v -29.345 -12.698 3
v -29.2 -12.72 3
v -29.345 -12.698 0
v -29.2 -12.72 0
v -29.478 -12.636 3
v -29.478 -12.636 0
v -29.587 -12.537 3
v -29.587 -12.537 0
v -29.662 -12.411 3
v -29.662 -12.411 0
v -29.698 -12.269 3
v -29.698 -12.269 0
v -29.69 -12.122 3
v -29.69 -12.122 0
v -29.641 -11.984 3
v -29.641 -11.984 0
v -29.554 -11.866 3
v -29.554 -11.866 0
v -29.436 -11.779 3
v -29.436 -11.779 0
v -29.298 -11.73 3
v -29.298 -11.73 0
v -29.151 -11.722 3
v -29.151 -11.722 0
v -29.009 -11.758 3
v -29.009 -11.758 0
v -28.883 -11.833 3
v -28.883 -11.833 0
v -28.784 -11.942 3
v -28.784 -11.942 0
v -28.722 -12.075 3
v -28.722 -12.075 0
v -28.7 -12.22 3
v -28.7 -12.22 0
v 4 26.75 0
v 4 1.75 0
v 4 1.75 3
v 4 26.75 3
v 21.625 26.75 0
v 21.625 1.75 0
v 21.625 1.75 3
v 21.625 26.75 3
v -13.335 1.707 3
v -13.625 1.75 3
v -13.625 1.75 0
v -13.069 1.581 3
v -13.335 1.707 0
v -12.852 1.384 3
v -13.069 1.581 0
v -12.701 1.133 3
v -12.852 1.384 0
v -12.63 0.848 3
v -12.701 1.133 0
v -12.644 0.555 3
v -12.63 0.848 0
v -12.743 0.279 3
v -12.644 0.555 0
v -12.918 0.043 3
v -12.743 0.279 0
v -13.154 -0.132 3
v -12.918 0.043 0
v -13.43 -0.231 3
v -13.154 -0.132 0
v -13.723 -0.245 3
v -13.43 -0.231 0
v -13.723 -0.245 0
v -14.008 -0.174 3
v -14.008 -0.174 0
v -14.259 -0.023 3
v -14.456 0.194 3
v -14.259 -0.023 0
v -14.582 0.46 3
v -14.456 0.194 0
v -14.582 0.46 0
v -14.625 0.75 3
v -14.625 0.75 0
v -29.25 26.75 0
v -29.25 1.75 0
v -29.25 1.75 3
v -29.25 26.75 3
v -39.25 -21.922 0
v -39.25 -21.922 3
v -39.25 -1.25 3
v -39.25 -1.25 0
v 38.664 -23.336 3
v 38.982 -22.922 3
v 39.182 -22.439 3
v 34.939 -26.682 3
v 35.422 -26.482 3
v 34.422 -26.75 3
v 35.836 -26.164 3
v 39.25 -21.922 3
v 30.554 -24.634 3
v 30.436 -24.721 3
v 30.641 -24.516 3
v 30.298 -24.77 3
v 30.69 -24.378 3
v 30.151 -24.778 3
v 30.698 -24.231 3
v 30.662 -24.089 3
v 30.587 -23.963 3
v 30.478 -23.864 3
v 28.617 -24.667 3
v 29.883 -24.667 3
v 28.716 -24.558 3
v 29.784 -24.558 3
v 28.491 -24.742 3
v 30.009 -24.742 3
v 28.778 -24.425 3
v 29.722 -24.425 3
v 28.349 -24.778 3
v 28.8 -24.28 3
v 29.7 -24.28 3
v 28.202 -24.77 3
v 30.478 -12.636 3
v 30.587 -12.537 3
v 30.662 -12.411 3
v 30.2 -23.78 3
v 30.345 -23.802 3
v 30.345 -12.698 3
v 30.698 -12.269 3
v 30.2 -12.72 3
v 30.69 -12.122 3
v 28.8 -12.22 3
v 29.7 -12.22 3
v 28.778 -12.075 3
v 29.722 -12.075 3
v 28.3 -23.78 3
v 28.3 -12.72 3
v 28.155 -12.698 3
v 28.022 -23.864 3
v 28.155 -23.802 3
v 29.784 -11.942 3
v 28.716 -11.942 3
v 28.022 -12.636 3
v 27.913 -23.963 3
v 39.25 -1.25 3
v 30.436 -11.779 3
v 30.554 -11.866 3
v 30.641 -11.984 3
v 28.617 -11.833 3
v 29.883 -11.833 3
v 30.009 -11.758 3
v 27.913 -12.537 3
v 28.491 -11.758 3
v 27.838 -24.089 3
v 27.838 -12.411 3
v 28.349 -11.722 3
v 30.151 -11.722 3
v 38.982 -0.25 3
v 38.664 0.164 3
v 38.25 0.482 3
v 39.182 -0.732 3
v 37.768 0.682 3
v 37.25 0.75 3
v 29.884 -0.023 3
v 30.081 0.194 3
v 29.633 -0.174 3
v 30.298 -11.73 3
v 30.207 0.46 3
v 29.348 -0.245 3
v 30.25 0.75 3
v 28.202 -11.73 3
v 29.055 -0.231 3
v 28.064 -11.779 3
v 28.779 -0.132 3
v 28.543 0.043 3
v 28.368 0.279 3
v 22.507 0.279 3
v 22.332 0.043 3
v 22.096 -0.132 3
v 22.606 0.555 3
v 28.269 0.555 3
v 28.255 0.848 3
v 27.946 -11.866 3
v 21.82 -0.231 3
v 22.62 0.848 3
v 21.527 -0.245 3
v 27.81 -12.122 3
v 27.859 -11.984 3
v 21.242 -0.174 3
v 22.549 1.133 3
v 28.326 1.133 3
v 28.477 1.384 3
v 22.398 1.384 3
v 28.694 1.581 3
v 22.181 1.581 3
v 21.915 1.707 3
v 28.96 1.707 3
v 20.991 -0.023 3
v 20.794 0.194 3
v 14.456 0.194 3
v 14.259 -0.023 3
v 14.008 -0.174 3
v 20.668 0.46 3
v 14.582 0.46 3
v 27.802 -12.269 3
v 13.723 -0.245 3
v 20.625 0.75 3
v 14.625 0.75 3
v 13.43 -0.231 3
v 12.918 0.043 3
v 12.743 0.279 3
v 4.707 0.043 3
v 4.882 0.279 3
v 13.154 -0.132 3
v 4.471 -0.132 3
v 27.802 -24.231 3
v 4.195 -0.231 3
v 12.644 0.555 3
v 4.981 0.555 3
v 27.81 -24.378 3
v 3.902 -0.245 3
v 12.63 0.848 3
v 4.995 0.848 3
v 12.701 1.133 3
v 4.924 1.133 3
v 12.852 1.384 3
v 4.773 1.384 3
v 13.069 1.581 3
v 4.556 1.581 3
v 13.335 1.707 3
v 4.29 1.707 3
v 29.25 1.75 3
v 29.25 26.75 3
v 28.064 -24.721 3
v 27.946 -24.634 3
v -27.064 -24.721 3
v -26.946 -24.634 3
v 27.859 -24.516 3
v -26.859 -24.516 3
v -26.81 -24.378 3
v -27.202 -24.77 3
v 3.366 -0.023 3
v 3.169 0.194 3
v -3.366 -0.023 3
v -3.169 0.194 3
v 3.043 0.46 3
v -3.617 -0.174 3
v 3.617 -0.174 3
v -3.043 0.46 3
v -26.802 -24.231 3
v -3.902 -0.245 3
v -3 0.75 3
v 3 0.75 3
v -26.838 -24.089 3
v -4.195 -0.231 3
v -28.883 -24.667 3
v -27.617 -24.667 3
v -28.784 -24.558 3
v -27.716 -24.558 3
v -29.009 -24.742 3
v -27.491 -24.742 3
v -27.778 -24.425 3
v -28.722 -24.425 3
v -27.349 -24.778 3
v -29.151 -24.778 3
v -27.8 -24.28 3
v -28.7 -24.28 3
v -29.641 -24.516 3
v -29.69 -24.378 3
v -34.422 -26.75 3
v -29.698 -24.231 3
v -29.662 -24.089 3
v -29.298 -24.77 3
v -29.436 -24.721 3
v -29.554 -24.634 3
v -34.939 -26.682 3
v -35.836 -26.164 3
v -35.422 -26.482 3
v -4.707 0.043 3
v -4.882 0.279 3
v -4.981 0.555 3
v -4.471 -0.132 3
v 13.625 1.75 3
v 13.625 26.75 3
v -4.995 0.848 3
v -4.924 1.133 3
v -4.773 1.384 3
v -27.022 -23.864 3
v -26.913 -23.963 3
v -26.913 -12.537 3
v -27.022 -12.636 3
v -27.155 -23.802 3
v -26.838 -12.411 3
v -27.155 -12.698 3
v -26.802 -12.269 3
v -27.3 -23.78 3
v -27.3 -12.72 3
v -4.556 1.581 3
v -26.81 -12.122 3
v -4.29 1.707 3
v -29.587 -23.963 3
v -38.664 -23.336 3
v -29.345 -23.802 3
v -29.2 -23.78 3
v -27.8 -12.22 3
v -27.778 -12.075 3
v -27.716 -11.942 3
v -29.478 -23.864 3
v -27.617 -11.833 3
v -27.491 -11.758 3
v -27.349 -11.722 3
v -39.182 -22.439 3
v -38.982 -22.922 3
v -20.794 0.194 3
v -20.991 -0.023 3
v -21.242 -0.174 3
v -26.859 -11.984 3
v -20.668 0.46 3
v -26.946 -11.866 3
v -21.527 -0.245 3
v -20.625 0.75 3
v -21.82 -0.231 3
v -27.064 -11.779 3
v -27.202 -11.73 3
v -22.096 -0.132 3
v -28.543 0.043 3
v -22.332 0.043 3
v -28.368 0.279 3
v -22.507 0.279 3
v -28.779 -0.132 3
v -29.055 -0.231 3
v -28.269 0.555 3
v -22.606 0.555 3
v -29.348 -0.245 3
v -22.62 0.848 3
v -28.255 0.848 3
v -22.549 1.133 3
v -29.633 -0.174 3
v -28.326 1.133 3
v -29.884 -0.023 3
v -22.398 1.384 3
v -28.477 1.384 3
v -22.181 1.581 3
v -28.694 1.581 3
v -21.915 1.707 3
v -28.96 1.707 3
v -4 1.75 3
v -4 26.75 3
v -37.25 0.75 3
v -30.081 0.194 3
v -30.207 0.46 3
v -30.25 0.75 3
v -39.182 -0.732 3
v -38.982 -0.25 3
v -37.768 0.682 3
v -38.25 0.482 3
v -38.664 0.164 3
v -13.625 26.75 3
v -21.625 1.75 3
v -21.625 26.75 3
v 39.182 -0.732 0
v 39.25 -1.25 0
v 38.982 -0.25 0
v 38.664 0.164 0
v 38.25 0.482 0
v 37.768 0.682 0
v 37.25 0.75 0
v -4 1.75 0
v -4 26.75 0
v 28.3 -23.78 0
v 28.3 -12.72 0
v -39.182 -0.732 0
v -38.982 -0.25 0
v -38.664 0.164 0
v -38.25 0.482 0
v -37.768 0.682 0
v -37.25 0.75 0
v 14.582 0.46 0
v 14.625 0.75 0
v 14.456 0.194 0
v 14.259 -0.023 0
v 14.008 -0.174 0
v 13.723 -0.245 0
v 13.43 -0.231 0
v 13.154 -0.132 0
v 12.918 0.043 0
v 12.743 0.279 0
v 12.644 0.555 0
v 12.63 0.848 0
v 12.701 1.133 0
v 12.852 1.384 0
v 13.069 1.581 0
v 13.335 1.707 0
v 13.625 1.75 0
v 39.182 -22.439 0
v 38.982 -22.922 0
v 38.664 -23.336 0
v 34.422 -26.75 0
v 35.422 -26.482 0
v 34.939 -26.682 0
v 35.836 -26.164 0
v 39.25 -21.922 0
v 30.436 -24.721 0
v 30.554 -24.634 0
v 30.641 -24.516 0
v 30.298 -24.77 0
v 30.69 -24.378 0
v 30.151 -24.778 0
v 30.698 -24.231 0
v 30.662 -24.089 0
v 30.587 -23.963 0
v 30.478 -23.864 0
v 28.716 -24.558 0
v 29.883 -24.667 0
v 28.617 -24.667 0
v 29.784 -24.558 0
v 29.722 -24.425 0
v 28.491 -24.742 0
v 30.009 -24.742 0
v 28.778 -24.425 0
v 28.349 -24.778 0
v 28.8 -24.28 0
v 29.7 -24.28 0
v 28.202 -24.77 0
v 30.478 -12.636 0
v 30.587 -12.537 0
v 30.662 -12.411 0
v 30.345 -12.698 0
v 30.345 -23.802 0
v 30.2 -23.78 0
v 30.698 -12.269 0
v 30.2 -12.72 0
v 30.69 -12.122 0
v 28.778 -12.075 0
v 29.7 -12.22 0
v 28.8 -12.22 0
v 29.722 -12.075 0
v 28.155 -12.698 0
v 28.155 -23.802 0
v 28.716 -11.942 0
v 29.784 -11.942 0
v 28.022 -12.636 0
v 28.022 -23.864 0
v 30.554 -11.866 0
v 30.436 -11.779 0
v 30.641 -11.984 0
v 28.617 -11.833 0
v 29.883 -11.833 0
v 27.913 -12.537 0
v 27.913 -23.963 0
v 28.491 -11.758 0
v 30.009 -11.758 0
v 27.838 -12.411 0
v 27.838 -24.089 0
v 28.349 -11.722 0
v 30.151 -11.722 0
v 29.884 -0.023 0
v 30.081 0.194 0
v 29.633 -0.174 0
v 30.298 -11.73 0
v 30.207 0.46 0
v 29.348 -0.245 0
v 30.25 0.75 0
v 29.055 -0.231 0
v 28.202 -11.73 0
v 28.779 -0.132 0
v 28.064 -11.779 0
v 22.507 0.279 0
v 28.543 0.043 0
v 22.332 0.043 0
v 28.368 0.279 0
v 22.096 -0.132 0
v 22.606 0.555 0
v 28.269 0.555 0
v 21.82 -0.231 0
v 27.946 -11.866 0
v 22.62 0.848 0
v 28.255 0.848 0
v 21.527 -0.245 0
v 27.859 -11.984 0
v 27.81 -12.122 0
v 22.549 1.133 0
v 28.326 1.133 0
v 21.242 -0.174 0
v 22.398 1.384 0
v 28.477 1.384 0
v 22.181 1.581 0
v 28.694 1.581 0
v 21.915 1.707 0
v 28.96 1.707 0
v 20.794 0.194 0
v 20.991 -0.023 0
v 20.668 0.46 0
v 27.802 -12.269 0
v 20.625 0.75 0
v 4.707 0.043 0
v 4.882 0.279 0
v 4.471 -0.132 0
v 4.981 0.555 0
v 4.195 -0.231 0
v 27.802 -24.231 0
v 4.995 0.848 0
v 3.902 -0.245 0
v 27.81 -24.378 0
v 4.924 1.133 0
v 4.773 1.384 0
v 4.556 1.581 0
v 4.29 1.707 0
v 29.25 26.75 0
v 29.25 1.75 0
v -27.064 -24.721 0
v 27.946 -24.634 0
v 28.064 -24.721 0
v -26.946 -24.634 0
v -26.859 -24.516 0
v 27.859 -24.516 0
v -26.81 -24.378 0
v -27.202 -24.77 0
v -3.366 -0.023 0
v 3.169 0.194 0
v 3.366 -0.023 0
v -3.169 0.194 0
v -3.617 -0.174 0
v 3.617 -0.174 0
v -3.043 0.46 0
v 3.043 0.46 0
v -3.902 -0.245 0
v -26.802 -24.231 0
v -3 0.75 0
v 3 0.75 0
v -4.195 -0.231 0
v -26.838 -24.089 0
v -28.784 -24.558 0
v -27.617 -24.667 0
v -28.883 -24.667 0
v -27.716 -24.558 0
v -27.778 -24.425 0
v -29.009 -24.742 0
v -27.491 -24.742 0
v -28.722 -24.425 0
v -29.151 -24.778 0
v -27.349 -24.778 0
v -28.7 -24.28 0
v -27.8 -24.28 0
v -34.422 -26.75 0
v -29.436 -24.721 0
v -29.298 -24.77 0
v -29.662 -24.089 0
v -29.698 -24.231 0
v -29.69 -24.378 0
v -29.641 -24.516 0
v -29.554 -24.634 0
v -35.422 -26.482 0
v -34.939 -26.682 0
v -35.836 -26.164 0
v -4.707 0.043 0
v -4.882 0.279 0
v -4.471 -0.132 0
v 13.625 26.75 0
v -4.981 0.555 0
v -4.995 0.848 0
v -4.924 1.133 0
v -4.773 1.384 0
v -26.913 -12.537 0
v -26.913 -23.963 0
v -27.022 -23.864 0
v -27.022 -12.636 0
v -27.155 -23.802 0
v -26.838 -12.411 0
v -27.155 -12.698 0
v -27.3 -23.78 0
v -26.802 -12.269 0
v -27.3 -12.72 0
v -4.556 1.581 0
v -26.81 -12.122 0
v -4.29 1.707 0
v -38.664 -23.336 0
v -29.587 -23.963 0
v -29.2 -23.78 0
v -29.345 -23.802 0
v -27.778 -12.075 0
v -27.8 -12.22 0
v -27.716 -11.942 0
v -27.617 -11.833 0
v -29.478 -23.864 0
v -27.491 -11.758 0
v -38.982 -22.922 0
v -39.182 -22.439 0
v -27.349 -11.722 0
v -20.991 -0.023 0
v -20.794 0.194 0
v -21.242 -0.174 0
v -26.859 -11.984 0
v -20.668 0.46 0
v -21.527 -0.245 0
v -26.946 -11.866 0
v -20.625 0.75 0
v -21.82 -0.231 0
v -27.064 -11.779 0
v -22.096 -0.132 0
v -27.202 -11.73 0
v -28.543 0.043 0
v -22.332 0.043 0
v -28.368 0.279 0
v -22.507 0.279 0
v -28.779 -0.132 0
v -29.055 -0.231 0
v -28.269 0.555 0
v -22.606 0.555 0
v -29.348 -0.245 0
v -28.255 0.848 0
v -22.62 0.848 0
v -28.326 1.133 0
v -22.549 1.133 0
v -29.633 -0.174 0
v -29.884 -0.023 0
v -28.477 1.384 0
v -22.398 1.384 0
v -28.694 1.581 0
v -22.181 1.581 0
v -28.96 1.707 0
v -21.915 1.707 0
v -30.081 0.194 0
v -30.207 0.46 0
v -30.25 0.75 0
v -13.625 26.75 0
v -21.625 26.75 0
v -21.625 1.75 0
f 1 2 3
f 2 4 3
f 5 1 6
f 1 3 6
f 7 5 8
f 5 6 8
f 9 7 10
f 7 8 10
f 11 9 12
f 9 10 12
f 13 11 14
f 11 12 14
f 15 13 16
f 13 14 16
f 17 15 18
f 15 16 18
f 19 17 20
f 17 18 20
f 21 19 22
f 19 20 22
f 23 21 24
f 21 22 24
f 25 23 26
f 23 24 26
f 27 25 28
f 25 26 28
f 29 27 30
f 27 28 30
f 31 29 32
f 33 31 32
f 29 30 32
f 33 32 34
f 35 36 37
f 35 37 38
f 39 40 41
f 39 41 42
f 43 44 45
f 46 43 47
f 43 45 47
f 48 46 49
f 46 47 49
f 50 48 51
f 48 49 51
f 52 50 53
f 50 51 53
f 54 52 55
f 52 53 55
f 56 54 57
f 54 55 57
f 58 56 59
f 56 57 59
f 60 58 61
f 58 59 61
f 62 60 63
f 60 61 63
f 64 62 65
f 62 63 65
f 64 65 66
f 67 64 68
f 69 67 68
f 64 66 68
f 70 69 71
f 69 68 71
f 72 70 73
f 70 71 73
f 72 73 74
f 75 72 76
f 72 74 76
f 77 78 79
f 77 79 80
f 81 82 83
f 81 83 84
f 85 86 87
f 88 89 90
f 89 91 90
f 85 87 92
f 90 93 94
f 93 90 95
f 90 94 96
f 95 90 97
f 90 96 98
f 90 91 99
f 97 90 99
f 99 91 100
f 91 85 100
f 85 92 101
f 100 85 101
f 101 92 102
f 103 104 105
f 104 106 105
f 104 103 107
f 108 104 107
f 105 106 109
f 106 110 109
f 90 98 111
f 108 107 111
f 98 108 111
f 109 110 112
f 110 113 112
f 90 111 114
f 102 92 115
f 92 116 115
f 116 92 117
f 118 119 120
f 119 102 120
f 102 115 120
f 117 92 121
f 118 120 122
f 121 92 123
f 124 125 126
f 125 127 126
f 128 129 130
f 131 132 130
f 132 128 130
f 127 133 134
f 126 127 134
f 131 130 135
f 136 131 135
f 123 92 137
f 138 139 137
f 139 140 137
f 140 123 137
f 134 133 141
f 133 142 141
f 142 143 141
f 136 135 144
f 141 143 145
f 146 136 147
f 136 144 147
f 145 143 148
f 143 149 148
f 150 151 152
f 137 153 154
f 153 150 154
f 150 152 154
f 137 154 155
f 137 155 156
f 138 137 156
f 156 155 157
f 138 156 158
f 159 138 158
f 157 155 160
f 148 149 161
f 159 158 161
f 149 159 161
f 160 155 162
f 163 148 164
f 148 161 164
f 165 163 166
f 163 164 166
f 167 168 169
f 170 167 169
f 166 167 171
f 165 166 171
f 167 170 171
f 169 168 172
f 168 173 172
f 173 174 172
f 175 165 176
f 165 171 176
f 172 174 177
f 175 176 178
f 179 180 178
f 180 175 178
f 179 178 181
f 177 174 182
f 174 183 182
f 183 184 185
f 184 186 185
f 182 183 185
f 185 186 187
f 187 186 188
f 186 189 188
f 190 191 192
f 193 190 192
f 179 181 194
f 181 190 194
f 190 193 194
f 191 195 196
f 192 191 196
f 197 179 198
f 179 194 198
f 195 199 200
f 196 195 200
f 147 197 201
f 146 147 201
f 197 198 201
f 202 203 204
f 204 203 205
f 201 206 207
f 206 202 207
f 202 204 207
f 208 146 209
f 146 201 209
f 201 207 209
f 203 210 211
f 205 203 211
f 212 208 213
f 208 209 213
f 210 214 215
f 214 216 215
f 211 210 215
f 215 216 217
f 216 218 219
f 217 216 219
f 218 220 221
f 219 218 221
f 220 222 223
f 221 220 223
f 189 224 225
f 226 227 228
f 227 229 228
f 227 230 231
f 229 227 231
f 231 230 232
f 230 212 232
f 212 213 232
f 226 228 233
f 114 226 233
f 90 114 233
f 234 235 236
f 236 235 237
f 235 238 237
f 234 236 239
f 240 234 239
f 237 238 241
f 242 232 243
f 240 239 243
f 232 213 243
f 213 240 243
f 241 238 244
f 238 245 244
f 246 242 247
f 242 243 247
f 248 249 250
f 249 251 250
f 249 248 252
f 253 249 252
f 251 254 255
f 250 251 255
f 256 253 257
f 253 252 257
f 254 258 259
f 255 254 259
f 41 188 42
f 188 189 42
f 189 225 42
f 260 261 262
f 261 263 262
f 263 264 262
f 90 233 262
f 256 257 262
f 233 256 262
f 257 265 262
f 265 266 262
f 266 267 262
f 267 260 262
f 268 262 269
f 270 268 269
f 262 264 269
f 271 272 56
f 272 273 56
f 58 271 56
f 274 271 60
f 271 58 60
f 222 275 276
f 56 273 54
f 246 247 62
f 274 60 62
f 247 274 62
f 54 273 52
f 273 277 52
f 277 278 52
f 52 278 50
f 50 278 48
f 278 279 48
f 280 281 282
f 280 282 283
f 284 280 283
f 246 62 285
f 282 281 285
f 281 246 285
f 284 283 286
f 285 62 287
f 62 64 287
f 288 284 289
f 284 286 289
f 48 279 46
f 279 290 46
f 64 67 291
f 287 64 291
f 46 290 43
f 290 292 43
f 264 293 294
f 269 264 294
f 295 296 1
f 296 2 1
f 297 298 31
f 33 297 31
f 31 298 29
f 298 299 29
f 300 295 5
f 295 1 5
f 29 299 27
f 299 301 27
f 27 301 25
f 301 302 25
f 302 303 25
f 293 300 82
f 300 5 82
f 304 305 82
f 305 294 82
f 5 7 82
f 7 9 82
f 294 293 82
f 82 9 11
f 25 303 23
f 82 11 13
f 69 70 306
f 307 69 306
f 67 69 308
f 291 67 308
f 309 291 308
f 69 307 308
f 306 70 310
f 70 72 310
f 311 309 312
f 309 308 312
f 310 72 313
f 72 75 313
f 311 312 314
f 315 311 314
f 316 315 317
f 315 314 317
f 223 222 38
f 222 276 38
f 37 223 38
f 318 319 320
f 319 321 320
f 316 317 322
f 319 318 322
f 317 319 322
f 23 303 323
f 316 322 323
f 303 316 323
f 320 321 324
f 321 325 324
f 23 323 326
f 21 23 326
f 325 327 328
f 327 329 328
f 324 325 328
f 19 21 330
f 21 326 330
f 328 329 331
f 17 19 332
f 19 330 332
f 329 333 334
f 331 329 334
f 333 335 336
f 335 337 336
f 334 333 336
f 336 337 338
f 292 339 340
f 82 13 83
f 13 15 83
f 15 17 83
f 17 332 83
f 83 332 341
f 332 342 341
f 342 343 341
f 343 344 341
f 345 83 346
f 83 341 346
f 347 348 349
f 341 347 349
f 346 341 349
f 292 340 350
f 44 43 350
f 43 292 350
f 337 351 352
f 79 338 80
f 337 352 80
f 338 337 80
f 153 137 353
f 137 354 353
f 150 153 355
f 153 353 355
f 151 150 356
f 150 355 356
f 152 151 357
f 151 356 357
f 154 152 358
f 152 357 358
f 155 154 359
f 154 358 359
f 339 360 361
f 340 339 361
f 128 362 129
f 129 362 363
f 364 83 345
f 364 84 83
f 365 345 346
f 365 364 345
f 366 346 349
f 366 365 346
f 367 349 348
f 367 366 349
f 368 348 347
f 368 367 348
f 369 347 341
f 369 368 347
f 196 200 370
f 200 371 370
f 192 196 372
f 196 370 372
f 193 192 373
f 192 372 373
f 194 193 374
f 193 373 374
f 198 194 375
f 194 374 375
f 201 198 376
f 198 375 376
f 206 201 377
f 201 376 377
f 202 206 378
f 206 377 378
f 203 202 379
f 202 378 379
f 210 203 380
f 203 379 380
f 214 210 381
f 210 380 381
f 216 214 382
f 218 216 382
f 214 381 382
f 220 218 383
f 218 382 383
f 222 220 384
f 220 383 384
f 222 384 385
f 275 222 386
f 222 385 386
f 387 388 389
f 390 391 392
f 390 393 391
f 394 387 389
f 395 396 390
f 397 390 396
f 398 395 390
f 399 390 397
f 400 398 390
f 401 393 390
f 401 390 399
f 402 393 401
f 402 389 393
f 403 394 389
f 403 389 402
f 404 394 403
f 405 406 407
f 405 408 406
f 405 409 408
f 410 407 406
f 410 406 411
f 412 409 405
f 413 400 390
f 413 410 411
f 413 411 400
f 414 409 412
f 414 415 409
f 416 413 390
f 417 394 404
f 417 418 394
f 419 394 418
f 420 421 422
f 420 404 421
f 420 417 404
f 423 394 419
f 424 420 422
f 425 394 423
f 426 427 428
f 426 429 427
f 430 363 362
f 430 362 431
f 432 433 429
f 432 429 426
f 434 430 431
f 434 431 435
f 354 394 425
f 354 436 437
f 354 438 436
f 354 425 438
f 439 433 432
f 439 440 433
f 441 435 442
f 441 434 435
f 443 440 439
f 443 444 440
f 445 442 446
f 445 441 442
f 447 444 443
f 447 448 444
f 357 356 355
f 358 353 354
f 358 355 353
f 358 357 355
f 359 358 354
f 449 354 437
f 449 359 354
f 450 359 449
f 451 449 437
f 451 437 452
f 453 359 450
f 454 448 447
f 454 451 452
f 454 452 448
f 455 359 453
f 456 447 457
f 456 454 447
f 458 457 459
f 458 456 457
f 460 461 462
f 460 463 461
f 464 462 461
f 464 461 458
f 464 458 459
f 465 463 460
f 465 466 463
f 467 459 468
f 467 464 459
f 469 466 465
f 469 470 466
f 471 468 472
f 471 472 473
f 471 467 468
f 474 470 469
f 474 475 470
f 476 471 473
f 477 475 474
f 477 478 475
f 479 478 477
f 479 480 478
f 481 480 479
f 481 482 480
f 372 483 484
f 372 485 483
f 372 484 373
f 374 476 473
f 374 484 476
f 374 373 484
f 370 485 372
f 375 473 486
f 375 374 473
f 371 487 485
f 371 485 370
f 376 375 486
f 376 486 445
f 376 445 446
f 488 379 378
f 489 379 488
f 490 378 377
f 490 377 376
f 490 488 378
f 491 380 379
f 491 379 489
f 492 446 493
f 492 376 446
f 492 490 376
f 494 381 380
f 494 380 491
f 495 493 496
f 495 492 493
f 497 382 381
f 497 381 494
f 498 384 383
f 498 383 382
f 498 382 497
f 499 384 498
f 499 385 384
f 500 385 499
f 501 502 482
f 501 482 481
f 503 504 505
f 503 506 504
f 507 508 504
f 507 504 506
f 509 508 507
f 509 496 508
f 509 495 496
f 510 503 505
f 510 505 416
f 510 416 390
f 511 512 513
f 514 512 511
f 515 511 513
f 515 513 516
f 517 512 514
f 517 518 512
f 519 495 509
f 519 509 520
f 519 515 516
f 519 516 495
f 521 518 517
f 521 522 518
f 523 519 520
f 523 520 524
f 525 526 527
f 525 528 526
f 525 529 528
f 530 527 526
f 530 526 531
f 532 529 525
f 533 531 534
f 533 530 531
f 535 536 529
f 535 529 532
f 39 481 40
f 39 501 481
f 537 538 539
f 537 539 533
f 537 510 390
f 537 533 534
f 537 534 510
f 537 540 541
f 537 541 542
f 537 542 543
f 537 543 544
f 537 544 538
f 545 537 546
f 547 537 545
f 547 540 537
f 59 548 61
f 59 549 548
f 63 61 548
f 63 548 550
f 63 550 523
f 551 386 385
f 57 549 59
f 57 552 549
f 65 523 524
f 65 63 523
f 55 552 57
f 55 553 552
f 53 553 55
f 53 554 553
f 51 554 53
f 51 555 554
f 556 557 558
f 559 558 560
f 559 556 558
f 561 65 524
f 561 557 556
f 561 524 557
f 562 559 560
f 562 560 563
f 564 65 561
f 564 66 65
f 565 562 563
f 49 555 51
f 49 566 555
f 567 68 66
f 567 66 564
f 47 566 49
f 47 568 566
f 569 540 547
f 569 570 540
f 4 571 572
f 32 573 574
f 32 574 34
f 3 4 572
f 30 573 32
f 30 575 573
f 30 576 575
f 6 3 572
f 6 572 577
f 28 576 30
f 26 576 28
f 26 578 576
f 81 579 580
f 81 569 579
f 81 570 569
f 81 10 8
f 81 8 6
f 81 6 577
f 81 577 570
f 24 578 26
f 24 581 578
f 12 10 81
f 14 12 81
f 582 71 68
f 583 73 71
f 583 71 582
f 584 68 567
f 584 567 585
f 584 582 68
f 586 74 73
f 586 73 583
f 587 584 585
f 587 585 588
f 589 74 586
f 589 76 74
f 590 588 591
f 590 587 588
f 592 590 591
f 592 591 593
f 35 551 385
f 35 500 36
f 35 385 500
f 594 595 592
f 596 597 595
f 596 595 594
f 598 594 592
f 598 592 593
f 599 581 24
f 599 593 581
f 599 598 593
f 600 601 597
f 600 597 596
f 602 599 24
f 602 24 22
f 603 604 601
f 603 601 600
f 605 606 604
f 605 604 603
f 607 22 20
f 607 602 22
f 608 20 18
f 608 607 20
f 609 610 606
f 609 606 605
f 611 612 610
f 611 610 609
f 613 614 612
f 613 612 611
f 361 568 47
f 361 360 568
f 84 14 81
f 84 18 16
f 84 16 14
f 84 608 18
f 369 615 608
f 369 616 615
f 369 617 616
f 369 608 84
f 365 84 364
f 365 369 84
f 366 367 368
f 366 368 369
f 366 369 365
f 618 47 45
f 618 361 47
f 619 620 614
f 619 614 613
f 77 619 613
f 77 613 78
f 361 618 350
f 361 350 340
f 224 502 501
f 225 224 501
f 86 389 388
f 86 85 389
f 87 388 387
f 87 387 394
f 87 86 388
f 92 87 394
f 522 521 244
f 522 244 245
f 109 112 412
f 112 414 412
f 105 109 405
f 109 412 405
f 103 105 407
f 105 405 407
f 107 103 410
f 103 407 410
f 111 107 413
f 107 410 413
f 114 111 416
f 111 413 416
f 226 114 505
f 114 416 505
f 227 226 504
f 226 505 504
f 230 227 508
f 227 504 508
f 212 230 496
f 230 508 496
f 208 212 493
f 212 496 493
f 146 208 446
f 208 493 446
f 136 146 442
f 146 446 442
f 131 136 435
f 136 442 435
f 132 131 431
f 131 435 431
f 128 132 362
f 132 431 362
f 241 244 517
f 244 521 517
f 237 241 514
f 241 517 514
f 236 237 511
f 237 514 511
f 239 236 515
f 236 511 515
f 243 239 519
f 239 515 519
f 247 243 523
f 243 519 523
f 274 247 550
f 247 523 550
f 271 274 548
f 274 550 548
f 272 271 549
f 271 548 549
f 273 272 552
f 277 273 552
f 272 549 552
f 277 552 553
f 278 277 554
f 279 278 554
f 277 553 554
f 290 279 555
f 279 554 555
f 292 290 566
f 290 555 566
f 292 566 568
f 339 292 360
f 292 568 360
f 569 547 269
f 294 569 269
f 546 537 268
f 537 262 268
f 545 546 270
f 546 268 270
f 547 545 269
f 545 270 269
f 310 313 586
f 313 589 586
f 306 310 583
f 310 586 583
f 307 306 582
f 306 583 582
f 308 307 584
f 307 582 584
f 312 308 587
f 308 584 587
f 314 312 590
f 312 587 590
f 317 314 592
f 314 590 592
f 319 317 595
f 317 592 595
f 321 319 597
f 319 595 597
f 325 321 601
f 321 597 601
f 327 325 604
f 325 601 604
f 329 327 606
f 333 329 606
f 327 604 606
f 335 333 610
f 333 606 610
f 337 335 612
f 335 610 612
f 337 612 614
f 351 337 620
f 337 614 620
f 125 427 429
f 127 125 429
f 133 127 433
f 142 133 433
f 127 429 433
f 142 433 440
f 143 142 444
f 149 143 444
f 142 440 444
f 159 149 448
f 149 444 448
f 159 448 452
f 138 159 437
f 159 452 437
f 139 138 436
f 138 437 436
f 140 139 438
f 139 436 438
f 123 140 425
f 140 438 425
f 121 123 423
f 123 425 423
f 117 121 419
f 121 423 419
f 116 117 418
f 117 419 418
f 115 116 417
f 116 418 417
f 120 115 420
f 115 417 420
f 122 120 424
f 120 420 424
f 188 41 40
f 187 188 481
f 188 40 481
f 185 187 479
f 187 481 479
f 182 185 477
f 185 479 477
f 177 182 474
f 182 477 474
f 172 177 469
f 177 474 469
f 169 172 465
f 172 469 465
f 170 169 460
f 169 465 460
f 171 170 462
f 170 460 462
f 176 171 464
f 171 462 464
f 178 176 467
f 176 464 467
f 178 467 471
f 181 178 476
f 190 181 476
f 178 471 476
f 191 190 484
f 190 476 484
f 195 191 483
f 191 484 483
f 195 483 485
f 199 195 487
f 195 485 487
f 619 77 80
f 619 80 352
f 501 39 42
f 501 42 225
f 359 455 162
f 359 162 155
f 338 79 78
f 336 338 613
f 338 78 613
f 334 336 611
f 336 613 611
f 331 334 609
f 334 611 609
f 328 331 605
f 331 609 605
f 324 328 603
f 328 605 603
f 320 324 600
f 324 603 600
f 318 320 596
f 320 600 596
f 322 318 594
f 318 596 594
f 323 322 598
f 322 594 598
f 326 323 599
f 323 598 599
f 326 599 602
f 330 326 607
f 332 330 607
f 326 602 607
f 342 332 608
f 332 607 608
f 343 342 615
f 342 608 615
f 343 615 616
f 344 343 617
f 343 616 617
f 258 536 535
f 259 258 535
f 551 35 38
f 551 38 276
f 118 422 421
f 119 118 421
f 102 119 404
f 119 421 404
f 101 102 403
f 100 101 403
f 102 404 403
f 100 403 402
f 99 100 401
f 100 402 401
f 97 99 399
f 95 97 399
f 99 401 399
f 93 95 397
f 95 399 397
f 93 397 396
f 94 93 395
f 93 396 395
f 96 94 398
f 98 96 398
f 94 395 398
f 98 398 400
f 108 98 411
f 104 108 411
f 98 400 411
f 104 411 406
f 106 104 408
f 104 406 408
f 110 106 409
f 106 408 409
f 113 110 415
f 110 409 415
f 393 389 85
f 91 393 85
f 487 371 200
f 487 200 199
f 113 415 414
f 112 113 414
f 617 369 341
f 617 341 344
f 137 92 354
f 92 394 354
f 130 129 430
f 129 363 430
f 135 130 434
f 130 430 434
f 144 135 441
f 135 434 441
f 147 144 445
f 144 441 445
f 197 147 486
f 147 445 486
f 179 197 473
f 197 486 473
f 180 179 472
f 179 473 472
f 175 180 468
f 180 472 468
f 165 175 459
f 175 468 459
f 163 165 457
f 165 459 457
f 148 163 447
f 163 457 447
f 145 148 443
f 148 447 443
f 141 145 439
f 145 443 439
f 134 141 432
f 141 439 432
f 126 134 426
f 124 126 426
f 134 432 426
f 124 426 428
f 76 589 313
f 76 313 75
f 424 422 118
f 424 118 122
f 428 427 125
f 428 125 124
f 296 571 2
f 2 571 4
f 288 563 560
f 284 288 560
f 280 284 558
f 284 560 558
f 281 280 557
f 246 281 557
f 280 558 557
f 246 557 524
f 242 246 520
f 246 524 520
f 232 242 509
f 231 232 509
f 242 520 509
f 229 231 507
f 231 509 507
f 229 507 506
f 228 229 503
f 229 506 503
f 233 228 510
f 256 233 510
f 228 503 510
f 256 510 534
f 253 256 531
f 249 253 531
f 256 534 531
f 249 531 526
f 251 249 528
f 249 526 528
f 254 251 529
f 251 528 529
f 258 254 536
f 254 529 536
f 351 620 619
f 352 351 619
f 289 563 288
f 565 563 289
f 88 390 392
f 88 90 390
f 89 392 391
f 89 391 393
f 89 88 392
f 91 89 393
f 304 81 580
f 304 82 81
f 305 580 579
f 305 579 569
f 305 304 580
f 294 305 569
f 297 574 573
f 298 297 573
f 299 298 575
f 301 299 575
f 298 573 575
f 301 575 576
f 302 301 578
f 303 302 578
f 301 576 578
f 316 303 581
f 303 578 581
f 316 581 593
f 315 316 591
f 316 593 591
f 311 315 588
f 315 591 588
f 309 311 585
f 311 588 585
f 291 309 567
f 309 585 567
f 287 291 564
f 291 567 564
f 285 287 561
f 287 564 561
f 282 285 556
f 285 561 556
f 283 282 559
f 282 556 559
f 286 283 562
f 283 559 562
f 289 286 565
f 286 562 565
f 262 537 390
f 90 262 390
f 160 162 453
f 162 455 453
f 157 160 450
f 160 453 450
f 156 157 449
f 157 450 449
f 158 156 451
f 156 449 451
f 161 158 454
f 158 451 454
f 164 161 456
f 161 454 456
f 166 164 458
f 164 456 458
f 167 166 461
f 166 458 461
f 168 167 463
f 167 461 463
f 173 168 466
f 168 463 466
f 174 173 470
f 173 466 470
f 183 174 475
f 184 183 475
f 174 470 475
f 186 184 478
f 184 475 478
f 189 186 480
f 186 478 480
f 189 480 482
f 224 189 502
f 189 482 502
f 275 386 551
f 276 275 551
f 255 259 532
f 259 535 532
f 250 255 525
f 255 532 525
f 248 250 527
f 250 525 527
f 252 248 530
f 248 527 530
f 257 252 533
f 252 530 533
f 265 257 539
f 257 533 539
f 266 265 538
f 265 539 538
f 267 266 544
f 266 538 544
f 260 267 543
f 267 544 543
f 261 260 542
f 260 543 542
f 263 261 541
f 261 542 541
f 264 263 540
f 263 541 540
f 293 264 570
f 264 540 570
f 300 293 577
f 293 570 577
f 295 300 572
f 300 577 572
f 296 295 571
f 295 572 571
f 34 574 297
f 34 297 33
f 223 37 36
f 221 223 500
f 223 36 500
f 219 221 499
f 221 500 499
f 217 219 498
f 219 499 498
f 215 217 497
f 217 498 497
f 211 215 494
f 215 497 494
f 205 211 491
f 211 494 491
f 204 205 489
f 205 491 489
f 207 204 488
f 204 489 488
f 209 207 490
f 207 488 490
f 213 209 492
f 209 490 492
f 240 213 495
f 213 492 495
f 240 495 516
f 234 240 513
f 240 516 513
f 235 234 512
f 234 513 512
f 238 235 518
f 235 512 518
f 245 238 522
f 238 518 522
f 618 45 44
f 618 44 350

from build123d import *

# Parameters (mm, degrees)
SKETCH_1_W          = 78.5
SKETCH_1_H          = 53.5
EXTRUDE_1_DEPTH     = 3
SKETCH_2_W          = 2
SKETCH_2_H          = 12
CUT_EXTRUDE_1_DEPTH = 5
SKETCH_3_W          = 8
SKETCH_3_H          = 26.5
CUT_EXTRUDE_2_DEPTH = 4
SKETCH_7_W          = 2
SKETCH_7_H          = 26.5
CUT_EXTRUDE_3_DEPTH = 10
SKETCH_8_W          = 2
SKETCH_8_H          = 12
CUT_EXTRUDE_4_DEPTH = 10
SKETCH_9_W          = 2.06
SKETCH_9_H          = 12.06
SKETCH_9_W_2        = 2
SKETCH_9_H_2        = 12
CUT_EXTRUDE_5_DEPTH = 10
CHAMFER_1_SIZE      = 4
SKETCH_11_W         = 78.5
SKETCH_11_H         = 3
EXTRUDE_2_DEPTH     = 0.5
FILLET_2_R          = 2
SKETCH_14_W         = 0.08
SKETCH_14_H         = 12.06
EXTRUDE_3_DEPTH     = 3
SKETCH_15_W         = 0.08
SKETCH_15_H         = 12.06
EXTRUDE_4_DEPTH     = 3
SKETCH_16_R         = 0.5
CUT_EXTRUDE_6_DEPTH = 10
SKETCH_17_R         = 1
CUT_EXTRUDE_7_DEPTH = 10


with BuildPart() as part:
    # 草图1 → 凸台-拉伸1 (new body)
    with BuildSketch(Plane.XY):
        Rectangle(SKETCH_1_W, SKETCH_1_H)
    extrude(amount=EXTRUDE_1_DEPTH)

    # 草图2 → 切除-拉伸1 (cut)
    with BuildSketch(Plane(origin=(0, 0, 0), x_dir=(-1, 0, 0), z_dir=(0, 0, -1))):
        with Locations((-29.25, -18.25)):
            Rectangle(SKETCH_2_W, SKETCH_2_H)
    extrude(amount=-CUT_EXTRUDE_1_DEPTH, mode=Mode.SUBTRACT)

    # 草图3 → 切除-拉伸2 (cut, through all)
    with BuildSketch(Plane(origin=(0, 0, 0), x_dir=(-1, 0, 0), z_dir=(0, 0, -1))):
        with Locations((-17.625, 13.5)):
            Rectangle(SKETCH_3_W, SKETCH_3_H)
        with Locations((35.25, 13.5)):
            Rectangle(SKETCH_3_W, SKETCH_3_H)
        with Locations((17.625, 13.5)):
            Rectangle(SKETCH_3_W, SKETCH_3_H)
        with Locations((0, 13.5)):
            Rectangle(SKETCH_3_W, SKETCH_3_H)
        with Locations((-35.25, 13.5)):
            Rectangle(SKETCH_3_W, SKETCH_3_H)
    extrude(amount=-CUT_EXTRUDE_2_DEPTH, mode=Mode.SUBTRACT)

    # 草图7 → 切除-拉伸3 (cut)
    with BuildSketch(Plane(origin=(0, 0, 0), x_dir=(-1, 0, 0), z_dir=(0, 0, -1))):
        with Locations((30.25, 13.5)):
            Rectangle(SKETCH_7_W, SKETCH_7_H)
        with Locations((-30.25, 13.5)):
            Rectangle(SKETCH_7_W, SKETCH_7_H)
    extrude(amount=-CUT_EXTRUDE_3_DEPTH, mode=Mode.SUBTRACT)

    # 草图8 → 切除-拉伸4 (cut)
    with BuildSketch(Plane(origin=(0, 0, 0), x_dir=(-1, 0, 0), z_dir=(0, 0, -1))):
        with Locations((28.25, -18.25)):
            Rectangle(SKETCH_8_W, SKETCH_8_H)
    extrude(amount=-CUT_EXTRUDE_4_DEPTH, mode=Mode.SUBTRACT)

    # 草图9 → 切除-拉伸5 (cut)
    with BuildSketch(Plane(origin=(0, 0, 0), x_dir=(-1, 0, 0), z_dir=(0, 0, -1))):
        with Locations((28.25, -18.25)):
            Rectangle(SKETCH_9_W, SKETCH_9_H)
        with Locations((28.25, -18.25)):
            Rectangle(SKETCH_9_W_2, SKETCH_9_H_2, mode=Mode.SUBTRACT)
        with Locations((-29.25, -18.25)):
            Rectangle(SKETCH_9_W, SKETCH_9_H)
        with Locations((-29.25, -18.25)):
            Rectangle(SKETCH_9_W_2, SKETCH_9_H_2, mode=Mode.SUBTRACT)
    extrude(amount=-CUT_EXTRUDE_5_DEPTH, mode=Mode.SUBTRACT)

    # 倒角1
    chamfer_1_edges = [part.edges().sort_by_distance(p)[0] for p in [
        (39.25, -26.75, 1.5),
        (-39.25, -26.75, 1.5),
    ]]
    chamfer(chamfer_1_edges, length=CHAMFER_1_SIZE)

    # 草图11 → 凸台-拉伸2 (add)
    with BuildSketch(Plane(origin=(0, 0.25, 0), x_dir=(1, 0, 0), z_dir=(0, 1, 0))):
        with Locations((0, -1.5)):
            Rectangle(SKETCH_11_W, SKETCH_11_H)
    extrude(amount=EXTRUDE_2_DEPTH)

    # 圆角2
    fillet_2_edges = [part.edges().sort_by_distance(p)[0] for p in [
        (35.25, -26.75, 1.5),
        (-35.25, -26.75, 1.5),
        (-39.25, -22.75, 1.5),
        (39.25, -22.75, 1.5),
        (-39.25, 0.75, 1.5),
        (39.25, 0.75, 1.5),
    ]]
    fillet(fillet_2_edges, radius=FILLET_2_R)

    # 草图14 → 凸台-拉伸3 (add)
    with BuildSketch(Plane(origin=(0, 0, 0), x_dir=(-1, 0, 0), z_dir=(0, 0, -1))):
        with Locations((-30.24, -18.25)):
            Rectangle(SKETCH_14_W, SKETCH_14_H)
        with Locations((-28.26, -18.25)):
            Rectangle(SKETCH_14_W, SKETCH_14_H)
    extrude(amount=-EXTRUDE_3_DEPTH)

    # 草图15 → 凸台-拉伸4 (add)
    with BuildSketch(Plane(origin=(0, 0, 0), x_dir=(-1, 0, 0), z_dir=(0, 0, -1))):
        with Locations((27.26, -18.25)):
            Rectangle(SKETCH_15_W, SKETCH_15_H)
        with Locations((29.24, -18.25)):
            Rectangle(SKETCH_15_W, SKETCH_15_H)
    extrude(amount=-EXTRUDE_4_DEPTH)

    # 草图16 → 切除-拉伸6 (cut)
    with BuildSketch(Plane(origin=(0, 0, 0), x_dir=(-1, 0, 0), z_dir=(0, 0, -1))):
        with Locations((-30.2, -12.22)):
            Circle(SKETCH_16_R)
        with Locations((-28.3, -12.22)):
            Circle(SKETCH_16_R)
        with Locations((-30.2, -24.28)):
            Circle(SKETCH_16_R)
        with Locations((-28.3, -24.28)):
            Circle(SKETCH_16_R)
        with Locations((27.3, -12.22)):
            Circle(SKETCH_16_R)
        with Locations((29.2, -12.22)):
            Circle(SKETCH_16_R)
        with Locations((27.3, -24.28)):
            Circle(SKETCH_16_R)
        with Locations((29.2, -24.28)):
            Circle(SKETCH_16_R)
    extrude(amount=-CUT_EXTRUDE_6_DEPTH, mode=Mode.SUBTRACT)

    # 草图17 → 切除-拉伸7 (cut)
    with BuildSketch(Plane(origin=(0, 0, 0), x_dir=(-1, 0, 0), z_dir=(0, 0, -1))):
        with Locations((-29.25, 0.75)):
            Circle(SKETCH_17_R)
        with Locations((-21.625, 0.75)):
            Circle(SKETCH_17_R)
        with Locations((-13.625, 0.75)):
            Circle(SKETCH_17_R)
        with Locations((-4, 0.75)):
            Circle(SKETCH_17_R)
        with Locations((4, 0.75)):
            Circle(SKETCH_17_R)
        with Locations((13.625, 0.75)):
            Circle(SKETCH_17_R)
        with Locations((21.625, 0.75)):
            Circle(SKETCH_17_R)
        with Locations((29.25, 0.75)):
            Circle(SKETCH_17_R)
    extrude(amount=-CUT_EXTRUDE_7_DEPTH, mode=Mode.SUBTRACT)


solid = part.part
